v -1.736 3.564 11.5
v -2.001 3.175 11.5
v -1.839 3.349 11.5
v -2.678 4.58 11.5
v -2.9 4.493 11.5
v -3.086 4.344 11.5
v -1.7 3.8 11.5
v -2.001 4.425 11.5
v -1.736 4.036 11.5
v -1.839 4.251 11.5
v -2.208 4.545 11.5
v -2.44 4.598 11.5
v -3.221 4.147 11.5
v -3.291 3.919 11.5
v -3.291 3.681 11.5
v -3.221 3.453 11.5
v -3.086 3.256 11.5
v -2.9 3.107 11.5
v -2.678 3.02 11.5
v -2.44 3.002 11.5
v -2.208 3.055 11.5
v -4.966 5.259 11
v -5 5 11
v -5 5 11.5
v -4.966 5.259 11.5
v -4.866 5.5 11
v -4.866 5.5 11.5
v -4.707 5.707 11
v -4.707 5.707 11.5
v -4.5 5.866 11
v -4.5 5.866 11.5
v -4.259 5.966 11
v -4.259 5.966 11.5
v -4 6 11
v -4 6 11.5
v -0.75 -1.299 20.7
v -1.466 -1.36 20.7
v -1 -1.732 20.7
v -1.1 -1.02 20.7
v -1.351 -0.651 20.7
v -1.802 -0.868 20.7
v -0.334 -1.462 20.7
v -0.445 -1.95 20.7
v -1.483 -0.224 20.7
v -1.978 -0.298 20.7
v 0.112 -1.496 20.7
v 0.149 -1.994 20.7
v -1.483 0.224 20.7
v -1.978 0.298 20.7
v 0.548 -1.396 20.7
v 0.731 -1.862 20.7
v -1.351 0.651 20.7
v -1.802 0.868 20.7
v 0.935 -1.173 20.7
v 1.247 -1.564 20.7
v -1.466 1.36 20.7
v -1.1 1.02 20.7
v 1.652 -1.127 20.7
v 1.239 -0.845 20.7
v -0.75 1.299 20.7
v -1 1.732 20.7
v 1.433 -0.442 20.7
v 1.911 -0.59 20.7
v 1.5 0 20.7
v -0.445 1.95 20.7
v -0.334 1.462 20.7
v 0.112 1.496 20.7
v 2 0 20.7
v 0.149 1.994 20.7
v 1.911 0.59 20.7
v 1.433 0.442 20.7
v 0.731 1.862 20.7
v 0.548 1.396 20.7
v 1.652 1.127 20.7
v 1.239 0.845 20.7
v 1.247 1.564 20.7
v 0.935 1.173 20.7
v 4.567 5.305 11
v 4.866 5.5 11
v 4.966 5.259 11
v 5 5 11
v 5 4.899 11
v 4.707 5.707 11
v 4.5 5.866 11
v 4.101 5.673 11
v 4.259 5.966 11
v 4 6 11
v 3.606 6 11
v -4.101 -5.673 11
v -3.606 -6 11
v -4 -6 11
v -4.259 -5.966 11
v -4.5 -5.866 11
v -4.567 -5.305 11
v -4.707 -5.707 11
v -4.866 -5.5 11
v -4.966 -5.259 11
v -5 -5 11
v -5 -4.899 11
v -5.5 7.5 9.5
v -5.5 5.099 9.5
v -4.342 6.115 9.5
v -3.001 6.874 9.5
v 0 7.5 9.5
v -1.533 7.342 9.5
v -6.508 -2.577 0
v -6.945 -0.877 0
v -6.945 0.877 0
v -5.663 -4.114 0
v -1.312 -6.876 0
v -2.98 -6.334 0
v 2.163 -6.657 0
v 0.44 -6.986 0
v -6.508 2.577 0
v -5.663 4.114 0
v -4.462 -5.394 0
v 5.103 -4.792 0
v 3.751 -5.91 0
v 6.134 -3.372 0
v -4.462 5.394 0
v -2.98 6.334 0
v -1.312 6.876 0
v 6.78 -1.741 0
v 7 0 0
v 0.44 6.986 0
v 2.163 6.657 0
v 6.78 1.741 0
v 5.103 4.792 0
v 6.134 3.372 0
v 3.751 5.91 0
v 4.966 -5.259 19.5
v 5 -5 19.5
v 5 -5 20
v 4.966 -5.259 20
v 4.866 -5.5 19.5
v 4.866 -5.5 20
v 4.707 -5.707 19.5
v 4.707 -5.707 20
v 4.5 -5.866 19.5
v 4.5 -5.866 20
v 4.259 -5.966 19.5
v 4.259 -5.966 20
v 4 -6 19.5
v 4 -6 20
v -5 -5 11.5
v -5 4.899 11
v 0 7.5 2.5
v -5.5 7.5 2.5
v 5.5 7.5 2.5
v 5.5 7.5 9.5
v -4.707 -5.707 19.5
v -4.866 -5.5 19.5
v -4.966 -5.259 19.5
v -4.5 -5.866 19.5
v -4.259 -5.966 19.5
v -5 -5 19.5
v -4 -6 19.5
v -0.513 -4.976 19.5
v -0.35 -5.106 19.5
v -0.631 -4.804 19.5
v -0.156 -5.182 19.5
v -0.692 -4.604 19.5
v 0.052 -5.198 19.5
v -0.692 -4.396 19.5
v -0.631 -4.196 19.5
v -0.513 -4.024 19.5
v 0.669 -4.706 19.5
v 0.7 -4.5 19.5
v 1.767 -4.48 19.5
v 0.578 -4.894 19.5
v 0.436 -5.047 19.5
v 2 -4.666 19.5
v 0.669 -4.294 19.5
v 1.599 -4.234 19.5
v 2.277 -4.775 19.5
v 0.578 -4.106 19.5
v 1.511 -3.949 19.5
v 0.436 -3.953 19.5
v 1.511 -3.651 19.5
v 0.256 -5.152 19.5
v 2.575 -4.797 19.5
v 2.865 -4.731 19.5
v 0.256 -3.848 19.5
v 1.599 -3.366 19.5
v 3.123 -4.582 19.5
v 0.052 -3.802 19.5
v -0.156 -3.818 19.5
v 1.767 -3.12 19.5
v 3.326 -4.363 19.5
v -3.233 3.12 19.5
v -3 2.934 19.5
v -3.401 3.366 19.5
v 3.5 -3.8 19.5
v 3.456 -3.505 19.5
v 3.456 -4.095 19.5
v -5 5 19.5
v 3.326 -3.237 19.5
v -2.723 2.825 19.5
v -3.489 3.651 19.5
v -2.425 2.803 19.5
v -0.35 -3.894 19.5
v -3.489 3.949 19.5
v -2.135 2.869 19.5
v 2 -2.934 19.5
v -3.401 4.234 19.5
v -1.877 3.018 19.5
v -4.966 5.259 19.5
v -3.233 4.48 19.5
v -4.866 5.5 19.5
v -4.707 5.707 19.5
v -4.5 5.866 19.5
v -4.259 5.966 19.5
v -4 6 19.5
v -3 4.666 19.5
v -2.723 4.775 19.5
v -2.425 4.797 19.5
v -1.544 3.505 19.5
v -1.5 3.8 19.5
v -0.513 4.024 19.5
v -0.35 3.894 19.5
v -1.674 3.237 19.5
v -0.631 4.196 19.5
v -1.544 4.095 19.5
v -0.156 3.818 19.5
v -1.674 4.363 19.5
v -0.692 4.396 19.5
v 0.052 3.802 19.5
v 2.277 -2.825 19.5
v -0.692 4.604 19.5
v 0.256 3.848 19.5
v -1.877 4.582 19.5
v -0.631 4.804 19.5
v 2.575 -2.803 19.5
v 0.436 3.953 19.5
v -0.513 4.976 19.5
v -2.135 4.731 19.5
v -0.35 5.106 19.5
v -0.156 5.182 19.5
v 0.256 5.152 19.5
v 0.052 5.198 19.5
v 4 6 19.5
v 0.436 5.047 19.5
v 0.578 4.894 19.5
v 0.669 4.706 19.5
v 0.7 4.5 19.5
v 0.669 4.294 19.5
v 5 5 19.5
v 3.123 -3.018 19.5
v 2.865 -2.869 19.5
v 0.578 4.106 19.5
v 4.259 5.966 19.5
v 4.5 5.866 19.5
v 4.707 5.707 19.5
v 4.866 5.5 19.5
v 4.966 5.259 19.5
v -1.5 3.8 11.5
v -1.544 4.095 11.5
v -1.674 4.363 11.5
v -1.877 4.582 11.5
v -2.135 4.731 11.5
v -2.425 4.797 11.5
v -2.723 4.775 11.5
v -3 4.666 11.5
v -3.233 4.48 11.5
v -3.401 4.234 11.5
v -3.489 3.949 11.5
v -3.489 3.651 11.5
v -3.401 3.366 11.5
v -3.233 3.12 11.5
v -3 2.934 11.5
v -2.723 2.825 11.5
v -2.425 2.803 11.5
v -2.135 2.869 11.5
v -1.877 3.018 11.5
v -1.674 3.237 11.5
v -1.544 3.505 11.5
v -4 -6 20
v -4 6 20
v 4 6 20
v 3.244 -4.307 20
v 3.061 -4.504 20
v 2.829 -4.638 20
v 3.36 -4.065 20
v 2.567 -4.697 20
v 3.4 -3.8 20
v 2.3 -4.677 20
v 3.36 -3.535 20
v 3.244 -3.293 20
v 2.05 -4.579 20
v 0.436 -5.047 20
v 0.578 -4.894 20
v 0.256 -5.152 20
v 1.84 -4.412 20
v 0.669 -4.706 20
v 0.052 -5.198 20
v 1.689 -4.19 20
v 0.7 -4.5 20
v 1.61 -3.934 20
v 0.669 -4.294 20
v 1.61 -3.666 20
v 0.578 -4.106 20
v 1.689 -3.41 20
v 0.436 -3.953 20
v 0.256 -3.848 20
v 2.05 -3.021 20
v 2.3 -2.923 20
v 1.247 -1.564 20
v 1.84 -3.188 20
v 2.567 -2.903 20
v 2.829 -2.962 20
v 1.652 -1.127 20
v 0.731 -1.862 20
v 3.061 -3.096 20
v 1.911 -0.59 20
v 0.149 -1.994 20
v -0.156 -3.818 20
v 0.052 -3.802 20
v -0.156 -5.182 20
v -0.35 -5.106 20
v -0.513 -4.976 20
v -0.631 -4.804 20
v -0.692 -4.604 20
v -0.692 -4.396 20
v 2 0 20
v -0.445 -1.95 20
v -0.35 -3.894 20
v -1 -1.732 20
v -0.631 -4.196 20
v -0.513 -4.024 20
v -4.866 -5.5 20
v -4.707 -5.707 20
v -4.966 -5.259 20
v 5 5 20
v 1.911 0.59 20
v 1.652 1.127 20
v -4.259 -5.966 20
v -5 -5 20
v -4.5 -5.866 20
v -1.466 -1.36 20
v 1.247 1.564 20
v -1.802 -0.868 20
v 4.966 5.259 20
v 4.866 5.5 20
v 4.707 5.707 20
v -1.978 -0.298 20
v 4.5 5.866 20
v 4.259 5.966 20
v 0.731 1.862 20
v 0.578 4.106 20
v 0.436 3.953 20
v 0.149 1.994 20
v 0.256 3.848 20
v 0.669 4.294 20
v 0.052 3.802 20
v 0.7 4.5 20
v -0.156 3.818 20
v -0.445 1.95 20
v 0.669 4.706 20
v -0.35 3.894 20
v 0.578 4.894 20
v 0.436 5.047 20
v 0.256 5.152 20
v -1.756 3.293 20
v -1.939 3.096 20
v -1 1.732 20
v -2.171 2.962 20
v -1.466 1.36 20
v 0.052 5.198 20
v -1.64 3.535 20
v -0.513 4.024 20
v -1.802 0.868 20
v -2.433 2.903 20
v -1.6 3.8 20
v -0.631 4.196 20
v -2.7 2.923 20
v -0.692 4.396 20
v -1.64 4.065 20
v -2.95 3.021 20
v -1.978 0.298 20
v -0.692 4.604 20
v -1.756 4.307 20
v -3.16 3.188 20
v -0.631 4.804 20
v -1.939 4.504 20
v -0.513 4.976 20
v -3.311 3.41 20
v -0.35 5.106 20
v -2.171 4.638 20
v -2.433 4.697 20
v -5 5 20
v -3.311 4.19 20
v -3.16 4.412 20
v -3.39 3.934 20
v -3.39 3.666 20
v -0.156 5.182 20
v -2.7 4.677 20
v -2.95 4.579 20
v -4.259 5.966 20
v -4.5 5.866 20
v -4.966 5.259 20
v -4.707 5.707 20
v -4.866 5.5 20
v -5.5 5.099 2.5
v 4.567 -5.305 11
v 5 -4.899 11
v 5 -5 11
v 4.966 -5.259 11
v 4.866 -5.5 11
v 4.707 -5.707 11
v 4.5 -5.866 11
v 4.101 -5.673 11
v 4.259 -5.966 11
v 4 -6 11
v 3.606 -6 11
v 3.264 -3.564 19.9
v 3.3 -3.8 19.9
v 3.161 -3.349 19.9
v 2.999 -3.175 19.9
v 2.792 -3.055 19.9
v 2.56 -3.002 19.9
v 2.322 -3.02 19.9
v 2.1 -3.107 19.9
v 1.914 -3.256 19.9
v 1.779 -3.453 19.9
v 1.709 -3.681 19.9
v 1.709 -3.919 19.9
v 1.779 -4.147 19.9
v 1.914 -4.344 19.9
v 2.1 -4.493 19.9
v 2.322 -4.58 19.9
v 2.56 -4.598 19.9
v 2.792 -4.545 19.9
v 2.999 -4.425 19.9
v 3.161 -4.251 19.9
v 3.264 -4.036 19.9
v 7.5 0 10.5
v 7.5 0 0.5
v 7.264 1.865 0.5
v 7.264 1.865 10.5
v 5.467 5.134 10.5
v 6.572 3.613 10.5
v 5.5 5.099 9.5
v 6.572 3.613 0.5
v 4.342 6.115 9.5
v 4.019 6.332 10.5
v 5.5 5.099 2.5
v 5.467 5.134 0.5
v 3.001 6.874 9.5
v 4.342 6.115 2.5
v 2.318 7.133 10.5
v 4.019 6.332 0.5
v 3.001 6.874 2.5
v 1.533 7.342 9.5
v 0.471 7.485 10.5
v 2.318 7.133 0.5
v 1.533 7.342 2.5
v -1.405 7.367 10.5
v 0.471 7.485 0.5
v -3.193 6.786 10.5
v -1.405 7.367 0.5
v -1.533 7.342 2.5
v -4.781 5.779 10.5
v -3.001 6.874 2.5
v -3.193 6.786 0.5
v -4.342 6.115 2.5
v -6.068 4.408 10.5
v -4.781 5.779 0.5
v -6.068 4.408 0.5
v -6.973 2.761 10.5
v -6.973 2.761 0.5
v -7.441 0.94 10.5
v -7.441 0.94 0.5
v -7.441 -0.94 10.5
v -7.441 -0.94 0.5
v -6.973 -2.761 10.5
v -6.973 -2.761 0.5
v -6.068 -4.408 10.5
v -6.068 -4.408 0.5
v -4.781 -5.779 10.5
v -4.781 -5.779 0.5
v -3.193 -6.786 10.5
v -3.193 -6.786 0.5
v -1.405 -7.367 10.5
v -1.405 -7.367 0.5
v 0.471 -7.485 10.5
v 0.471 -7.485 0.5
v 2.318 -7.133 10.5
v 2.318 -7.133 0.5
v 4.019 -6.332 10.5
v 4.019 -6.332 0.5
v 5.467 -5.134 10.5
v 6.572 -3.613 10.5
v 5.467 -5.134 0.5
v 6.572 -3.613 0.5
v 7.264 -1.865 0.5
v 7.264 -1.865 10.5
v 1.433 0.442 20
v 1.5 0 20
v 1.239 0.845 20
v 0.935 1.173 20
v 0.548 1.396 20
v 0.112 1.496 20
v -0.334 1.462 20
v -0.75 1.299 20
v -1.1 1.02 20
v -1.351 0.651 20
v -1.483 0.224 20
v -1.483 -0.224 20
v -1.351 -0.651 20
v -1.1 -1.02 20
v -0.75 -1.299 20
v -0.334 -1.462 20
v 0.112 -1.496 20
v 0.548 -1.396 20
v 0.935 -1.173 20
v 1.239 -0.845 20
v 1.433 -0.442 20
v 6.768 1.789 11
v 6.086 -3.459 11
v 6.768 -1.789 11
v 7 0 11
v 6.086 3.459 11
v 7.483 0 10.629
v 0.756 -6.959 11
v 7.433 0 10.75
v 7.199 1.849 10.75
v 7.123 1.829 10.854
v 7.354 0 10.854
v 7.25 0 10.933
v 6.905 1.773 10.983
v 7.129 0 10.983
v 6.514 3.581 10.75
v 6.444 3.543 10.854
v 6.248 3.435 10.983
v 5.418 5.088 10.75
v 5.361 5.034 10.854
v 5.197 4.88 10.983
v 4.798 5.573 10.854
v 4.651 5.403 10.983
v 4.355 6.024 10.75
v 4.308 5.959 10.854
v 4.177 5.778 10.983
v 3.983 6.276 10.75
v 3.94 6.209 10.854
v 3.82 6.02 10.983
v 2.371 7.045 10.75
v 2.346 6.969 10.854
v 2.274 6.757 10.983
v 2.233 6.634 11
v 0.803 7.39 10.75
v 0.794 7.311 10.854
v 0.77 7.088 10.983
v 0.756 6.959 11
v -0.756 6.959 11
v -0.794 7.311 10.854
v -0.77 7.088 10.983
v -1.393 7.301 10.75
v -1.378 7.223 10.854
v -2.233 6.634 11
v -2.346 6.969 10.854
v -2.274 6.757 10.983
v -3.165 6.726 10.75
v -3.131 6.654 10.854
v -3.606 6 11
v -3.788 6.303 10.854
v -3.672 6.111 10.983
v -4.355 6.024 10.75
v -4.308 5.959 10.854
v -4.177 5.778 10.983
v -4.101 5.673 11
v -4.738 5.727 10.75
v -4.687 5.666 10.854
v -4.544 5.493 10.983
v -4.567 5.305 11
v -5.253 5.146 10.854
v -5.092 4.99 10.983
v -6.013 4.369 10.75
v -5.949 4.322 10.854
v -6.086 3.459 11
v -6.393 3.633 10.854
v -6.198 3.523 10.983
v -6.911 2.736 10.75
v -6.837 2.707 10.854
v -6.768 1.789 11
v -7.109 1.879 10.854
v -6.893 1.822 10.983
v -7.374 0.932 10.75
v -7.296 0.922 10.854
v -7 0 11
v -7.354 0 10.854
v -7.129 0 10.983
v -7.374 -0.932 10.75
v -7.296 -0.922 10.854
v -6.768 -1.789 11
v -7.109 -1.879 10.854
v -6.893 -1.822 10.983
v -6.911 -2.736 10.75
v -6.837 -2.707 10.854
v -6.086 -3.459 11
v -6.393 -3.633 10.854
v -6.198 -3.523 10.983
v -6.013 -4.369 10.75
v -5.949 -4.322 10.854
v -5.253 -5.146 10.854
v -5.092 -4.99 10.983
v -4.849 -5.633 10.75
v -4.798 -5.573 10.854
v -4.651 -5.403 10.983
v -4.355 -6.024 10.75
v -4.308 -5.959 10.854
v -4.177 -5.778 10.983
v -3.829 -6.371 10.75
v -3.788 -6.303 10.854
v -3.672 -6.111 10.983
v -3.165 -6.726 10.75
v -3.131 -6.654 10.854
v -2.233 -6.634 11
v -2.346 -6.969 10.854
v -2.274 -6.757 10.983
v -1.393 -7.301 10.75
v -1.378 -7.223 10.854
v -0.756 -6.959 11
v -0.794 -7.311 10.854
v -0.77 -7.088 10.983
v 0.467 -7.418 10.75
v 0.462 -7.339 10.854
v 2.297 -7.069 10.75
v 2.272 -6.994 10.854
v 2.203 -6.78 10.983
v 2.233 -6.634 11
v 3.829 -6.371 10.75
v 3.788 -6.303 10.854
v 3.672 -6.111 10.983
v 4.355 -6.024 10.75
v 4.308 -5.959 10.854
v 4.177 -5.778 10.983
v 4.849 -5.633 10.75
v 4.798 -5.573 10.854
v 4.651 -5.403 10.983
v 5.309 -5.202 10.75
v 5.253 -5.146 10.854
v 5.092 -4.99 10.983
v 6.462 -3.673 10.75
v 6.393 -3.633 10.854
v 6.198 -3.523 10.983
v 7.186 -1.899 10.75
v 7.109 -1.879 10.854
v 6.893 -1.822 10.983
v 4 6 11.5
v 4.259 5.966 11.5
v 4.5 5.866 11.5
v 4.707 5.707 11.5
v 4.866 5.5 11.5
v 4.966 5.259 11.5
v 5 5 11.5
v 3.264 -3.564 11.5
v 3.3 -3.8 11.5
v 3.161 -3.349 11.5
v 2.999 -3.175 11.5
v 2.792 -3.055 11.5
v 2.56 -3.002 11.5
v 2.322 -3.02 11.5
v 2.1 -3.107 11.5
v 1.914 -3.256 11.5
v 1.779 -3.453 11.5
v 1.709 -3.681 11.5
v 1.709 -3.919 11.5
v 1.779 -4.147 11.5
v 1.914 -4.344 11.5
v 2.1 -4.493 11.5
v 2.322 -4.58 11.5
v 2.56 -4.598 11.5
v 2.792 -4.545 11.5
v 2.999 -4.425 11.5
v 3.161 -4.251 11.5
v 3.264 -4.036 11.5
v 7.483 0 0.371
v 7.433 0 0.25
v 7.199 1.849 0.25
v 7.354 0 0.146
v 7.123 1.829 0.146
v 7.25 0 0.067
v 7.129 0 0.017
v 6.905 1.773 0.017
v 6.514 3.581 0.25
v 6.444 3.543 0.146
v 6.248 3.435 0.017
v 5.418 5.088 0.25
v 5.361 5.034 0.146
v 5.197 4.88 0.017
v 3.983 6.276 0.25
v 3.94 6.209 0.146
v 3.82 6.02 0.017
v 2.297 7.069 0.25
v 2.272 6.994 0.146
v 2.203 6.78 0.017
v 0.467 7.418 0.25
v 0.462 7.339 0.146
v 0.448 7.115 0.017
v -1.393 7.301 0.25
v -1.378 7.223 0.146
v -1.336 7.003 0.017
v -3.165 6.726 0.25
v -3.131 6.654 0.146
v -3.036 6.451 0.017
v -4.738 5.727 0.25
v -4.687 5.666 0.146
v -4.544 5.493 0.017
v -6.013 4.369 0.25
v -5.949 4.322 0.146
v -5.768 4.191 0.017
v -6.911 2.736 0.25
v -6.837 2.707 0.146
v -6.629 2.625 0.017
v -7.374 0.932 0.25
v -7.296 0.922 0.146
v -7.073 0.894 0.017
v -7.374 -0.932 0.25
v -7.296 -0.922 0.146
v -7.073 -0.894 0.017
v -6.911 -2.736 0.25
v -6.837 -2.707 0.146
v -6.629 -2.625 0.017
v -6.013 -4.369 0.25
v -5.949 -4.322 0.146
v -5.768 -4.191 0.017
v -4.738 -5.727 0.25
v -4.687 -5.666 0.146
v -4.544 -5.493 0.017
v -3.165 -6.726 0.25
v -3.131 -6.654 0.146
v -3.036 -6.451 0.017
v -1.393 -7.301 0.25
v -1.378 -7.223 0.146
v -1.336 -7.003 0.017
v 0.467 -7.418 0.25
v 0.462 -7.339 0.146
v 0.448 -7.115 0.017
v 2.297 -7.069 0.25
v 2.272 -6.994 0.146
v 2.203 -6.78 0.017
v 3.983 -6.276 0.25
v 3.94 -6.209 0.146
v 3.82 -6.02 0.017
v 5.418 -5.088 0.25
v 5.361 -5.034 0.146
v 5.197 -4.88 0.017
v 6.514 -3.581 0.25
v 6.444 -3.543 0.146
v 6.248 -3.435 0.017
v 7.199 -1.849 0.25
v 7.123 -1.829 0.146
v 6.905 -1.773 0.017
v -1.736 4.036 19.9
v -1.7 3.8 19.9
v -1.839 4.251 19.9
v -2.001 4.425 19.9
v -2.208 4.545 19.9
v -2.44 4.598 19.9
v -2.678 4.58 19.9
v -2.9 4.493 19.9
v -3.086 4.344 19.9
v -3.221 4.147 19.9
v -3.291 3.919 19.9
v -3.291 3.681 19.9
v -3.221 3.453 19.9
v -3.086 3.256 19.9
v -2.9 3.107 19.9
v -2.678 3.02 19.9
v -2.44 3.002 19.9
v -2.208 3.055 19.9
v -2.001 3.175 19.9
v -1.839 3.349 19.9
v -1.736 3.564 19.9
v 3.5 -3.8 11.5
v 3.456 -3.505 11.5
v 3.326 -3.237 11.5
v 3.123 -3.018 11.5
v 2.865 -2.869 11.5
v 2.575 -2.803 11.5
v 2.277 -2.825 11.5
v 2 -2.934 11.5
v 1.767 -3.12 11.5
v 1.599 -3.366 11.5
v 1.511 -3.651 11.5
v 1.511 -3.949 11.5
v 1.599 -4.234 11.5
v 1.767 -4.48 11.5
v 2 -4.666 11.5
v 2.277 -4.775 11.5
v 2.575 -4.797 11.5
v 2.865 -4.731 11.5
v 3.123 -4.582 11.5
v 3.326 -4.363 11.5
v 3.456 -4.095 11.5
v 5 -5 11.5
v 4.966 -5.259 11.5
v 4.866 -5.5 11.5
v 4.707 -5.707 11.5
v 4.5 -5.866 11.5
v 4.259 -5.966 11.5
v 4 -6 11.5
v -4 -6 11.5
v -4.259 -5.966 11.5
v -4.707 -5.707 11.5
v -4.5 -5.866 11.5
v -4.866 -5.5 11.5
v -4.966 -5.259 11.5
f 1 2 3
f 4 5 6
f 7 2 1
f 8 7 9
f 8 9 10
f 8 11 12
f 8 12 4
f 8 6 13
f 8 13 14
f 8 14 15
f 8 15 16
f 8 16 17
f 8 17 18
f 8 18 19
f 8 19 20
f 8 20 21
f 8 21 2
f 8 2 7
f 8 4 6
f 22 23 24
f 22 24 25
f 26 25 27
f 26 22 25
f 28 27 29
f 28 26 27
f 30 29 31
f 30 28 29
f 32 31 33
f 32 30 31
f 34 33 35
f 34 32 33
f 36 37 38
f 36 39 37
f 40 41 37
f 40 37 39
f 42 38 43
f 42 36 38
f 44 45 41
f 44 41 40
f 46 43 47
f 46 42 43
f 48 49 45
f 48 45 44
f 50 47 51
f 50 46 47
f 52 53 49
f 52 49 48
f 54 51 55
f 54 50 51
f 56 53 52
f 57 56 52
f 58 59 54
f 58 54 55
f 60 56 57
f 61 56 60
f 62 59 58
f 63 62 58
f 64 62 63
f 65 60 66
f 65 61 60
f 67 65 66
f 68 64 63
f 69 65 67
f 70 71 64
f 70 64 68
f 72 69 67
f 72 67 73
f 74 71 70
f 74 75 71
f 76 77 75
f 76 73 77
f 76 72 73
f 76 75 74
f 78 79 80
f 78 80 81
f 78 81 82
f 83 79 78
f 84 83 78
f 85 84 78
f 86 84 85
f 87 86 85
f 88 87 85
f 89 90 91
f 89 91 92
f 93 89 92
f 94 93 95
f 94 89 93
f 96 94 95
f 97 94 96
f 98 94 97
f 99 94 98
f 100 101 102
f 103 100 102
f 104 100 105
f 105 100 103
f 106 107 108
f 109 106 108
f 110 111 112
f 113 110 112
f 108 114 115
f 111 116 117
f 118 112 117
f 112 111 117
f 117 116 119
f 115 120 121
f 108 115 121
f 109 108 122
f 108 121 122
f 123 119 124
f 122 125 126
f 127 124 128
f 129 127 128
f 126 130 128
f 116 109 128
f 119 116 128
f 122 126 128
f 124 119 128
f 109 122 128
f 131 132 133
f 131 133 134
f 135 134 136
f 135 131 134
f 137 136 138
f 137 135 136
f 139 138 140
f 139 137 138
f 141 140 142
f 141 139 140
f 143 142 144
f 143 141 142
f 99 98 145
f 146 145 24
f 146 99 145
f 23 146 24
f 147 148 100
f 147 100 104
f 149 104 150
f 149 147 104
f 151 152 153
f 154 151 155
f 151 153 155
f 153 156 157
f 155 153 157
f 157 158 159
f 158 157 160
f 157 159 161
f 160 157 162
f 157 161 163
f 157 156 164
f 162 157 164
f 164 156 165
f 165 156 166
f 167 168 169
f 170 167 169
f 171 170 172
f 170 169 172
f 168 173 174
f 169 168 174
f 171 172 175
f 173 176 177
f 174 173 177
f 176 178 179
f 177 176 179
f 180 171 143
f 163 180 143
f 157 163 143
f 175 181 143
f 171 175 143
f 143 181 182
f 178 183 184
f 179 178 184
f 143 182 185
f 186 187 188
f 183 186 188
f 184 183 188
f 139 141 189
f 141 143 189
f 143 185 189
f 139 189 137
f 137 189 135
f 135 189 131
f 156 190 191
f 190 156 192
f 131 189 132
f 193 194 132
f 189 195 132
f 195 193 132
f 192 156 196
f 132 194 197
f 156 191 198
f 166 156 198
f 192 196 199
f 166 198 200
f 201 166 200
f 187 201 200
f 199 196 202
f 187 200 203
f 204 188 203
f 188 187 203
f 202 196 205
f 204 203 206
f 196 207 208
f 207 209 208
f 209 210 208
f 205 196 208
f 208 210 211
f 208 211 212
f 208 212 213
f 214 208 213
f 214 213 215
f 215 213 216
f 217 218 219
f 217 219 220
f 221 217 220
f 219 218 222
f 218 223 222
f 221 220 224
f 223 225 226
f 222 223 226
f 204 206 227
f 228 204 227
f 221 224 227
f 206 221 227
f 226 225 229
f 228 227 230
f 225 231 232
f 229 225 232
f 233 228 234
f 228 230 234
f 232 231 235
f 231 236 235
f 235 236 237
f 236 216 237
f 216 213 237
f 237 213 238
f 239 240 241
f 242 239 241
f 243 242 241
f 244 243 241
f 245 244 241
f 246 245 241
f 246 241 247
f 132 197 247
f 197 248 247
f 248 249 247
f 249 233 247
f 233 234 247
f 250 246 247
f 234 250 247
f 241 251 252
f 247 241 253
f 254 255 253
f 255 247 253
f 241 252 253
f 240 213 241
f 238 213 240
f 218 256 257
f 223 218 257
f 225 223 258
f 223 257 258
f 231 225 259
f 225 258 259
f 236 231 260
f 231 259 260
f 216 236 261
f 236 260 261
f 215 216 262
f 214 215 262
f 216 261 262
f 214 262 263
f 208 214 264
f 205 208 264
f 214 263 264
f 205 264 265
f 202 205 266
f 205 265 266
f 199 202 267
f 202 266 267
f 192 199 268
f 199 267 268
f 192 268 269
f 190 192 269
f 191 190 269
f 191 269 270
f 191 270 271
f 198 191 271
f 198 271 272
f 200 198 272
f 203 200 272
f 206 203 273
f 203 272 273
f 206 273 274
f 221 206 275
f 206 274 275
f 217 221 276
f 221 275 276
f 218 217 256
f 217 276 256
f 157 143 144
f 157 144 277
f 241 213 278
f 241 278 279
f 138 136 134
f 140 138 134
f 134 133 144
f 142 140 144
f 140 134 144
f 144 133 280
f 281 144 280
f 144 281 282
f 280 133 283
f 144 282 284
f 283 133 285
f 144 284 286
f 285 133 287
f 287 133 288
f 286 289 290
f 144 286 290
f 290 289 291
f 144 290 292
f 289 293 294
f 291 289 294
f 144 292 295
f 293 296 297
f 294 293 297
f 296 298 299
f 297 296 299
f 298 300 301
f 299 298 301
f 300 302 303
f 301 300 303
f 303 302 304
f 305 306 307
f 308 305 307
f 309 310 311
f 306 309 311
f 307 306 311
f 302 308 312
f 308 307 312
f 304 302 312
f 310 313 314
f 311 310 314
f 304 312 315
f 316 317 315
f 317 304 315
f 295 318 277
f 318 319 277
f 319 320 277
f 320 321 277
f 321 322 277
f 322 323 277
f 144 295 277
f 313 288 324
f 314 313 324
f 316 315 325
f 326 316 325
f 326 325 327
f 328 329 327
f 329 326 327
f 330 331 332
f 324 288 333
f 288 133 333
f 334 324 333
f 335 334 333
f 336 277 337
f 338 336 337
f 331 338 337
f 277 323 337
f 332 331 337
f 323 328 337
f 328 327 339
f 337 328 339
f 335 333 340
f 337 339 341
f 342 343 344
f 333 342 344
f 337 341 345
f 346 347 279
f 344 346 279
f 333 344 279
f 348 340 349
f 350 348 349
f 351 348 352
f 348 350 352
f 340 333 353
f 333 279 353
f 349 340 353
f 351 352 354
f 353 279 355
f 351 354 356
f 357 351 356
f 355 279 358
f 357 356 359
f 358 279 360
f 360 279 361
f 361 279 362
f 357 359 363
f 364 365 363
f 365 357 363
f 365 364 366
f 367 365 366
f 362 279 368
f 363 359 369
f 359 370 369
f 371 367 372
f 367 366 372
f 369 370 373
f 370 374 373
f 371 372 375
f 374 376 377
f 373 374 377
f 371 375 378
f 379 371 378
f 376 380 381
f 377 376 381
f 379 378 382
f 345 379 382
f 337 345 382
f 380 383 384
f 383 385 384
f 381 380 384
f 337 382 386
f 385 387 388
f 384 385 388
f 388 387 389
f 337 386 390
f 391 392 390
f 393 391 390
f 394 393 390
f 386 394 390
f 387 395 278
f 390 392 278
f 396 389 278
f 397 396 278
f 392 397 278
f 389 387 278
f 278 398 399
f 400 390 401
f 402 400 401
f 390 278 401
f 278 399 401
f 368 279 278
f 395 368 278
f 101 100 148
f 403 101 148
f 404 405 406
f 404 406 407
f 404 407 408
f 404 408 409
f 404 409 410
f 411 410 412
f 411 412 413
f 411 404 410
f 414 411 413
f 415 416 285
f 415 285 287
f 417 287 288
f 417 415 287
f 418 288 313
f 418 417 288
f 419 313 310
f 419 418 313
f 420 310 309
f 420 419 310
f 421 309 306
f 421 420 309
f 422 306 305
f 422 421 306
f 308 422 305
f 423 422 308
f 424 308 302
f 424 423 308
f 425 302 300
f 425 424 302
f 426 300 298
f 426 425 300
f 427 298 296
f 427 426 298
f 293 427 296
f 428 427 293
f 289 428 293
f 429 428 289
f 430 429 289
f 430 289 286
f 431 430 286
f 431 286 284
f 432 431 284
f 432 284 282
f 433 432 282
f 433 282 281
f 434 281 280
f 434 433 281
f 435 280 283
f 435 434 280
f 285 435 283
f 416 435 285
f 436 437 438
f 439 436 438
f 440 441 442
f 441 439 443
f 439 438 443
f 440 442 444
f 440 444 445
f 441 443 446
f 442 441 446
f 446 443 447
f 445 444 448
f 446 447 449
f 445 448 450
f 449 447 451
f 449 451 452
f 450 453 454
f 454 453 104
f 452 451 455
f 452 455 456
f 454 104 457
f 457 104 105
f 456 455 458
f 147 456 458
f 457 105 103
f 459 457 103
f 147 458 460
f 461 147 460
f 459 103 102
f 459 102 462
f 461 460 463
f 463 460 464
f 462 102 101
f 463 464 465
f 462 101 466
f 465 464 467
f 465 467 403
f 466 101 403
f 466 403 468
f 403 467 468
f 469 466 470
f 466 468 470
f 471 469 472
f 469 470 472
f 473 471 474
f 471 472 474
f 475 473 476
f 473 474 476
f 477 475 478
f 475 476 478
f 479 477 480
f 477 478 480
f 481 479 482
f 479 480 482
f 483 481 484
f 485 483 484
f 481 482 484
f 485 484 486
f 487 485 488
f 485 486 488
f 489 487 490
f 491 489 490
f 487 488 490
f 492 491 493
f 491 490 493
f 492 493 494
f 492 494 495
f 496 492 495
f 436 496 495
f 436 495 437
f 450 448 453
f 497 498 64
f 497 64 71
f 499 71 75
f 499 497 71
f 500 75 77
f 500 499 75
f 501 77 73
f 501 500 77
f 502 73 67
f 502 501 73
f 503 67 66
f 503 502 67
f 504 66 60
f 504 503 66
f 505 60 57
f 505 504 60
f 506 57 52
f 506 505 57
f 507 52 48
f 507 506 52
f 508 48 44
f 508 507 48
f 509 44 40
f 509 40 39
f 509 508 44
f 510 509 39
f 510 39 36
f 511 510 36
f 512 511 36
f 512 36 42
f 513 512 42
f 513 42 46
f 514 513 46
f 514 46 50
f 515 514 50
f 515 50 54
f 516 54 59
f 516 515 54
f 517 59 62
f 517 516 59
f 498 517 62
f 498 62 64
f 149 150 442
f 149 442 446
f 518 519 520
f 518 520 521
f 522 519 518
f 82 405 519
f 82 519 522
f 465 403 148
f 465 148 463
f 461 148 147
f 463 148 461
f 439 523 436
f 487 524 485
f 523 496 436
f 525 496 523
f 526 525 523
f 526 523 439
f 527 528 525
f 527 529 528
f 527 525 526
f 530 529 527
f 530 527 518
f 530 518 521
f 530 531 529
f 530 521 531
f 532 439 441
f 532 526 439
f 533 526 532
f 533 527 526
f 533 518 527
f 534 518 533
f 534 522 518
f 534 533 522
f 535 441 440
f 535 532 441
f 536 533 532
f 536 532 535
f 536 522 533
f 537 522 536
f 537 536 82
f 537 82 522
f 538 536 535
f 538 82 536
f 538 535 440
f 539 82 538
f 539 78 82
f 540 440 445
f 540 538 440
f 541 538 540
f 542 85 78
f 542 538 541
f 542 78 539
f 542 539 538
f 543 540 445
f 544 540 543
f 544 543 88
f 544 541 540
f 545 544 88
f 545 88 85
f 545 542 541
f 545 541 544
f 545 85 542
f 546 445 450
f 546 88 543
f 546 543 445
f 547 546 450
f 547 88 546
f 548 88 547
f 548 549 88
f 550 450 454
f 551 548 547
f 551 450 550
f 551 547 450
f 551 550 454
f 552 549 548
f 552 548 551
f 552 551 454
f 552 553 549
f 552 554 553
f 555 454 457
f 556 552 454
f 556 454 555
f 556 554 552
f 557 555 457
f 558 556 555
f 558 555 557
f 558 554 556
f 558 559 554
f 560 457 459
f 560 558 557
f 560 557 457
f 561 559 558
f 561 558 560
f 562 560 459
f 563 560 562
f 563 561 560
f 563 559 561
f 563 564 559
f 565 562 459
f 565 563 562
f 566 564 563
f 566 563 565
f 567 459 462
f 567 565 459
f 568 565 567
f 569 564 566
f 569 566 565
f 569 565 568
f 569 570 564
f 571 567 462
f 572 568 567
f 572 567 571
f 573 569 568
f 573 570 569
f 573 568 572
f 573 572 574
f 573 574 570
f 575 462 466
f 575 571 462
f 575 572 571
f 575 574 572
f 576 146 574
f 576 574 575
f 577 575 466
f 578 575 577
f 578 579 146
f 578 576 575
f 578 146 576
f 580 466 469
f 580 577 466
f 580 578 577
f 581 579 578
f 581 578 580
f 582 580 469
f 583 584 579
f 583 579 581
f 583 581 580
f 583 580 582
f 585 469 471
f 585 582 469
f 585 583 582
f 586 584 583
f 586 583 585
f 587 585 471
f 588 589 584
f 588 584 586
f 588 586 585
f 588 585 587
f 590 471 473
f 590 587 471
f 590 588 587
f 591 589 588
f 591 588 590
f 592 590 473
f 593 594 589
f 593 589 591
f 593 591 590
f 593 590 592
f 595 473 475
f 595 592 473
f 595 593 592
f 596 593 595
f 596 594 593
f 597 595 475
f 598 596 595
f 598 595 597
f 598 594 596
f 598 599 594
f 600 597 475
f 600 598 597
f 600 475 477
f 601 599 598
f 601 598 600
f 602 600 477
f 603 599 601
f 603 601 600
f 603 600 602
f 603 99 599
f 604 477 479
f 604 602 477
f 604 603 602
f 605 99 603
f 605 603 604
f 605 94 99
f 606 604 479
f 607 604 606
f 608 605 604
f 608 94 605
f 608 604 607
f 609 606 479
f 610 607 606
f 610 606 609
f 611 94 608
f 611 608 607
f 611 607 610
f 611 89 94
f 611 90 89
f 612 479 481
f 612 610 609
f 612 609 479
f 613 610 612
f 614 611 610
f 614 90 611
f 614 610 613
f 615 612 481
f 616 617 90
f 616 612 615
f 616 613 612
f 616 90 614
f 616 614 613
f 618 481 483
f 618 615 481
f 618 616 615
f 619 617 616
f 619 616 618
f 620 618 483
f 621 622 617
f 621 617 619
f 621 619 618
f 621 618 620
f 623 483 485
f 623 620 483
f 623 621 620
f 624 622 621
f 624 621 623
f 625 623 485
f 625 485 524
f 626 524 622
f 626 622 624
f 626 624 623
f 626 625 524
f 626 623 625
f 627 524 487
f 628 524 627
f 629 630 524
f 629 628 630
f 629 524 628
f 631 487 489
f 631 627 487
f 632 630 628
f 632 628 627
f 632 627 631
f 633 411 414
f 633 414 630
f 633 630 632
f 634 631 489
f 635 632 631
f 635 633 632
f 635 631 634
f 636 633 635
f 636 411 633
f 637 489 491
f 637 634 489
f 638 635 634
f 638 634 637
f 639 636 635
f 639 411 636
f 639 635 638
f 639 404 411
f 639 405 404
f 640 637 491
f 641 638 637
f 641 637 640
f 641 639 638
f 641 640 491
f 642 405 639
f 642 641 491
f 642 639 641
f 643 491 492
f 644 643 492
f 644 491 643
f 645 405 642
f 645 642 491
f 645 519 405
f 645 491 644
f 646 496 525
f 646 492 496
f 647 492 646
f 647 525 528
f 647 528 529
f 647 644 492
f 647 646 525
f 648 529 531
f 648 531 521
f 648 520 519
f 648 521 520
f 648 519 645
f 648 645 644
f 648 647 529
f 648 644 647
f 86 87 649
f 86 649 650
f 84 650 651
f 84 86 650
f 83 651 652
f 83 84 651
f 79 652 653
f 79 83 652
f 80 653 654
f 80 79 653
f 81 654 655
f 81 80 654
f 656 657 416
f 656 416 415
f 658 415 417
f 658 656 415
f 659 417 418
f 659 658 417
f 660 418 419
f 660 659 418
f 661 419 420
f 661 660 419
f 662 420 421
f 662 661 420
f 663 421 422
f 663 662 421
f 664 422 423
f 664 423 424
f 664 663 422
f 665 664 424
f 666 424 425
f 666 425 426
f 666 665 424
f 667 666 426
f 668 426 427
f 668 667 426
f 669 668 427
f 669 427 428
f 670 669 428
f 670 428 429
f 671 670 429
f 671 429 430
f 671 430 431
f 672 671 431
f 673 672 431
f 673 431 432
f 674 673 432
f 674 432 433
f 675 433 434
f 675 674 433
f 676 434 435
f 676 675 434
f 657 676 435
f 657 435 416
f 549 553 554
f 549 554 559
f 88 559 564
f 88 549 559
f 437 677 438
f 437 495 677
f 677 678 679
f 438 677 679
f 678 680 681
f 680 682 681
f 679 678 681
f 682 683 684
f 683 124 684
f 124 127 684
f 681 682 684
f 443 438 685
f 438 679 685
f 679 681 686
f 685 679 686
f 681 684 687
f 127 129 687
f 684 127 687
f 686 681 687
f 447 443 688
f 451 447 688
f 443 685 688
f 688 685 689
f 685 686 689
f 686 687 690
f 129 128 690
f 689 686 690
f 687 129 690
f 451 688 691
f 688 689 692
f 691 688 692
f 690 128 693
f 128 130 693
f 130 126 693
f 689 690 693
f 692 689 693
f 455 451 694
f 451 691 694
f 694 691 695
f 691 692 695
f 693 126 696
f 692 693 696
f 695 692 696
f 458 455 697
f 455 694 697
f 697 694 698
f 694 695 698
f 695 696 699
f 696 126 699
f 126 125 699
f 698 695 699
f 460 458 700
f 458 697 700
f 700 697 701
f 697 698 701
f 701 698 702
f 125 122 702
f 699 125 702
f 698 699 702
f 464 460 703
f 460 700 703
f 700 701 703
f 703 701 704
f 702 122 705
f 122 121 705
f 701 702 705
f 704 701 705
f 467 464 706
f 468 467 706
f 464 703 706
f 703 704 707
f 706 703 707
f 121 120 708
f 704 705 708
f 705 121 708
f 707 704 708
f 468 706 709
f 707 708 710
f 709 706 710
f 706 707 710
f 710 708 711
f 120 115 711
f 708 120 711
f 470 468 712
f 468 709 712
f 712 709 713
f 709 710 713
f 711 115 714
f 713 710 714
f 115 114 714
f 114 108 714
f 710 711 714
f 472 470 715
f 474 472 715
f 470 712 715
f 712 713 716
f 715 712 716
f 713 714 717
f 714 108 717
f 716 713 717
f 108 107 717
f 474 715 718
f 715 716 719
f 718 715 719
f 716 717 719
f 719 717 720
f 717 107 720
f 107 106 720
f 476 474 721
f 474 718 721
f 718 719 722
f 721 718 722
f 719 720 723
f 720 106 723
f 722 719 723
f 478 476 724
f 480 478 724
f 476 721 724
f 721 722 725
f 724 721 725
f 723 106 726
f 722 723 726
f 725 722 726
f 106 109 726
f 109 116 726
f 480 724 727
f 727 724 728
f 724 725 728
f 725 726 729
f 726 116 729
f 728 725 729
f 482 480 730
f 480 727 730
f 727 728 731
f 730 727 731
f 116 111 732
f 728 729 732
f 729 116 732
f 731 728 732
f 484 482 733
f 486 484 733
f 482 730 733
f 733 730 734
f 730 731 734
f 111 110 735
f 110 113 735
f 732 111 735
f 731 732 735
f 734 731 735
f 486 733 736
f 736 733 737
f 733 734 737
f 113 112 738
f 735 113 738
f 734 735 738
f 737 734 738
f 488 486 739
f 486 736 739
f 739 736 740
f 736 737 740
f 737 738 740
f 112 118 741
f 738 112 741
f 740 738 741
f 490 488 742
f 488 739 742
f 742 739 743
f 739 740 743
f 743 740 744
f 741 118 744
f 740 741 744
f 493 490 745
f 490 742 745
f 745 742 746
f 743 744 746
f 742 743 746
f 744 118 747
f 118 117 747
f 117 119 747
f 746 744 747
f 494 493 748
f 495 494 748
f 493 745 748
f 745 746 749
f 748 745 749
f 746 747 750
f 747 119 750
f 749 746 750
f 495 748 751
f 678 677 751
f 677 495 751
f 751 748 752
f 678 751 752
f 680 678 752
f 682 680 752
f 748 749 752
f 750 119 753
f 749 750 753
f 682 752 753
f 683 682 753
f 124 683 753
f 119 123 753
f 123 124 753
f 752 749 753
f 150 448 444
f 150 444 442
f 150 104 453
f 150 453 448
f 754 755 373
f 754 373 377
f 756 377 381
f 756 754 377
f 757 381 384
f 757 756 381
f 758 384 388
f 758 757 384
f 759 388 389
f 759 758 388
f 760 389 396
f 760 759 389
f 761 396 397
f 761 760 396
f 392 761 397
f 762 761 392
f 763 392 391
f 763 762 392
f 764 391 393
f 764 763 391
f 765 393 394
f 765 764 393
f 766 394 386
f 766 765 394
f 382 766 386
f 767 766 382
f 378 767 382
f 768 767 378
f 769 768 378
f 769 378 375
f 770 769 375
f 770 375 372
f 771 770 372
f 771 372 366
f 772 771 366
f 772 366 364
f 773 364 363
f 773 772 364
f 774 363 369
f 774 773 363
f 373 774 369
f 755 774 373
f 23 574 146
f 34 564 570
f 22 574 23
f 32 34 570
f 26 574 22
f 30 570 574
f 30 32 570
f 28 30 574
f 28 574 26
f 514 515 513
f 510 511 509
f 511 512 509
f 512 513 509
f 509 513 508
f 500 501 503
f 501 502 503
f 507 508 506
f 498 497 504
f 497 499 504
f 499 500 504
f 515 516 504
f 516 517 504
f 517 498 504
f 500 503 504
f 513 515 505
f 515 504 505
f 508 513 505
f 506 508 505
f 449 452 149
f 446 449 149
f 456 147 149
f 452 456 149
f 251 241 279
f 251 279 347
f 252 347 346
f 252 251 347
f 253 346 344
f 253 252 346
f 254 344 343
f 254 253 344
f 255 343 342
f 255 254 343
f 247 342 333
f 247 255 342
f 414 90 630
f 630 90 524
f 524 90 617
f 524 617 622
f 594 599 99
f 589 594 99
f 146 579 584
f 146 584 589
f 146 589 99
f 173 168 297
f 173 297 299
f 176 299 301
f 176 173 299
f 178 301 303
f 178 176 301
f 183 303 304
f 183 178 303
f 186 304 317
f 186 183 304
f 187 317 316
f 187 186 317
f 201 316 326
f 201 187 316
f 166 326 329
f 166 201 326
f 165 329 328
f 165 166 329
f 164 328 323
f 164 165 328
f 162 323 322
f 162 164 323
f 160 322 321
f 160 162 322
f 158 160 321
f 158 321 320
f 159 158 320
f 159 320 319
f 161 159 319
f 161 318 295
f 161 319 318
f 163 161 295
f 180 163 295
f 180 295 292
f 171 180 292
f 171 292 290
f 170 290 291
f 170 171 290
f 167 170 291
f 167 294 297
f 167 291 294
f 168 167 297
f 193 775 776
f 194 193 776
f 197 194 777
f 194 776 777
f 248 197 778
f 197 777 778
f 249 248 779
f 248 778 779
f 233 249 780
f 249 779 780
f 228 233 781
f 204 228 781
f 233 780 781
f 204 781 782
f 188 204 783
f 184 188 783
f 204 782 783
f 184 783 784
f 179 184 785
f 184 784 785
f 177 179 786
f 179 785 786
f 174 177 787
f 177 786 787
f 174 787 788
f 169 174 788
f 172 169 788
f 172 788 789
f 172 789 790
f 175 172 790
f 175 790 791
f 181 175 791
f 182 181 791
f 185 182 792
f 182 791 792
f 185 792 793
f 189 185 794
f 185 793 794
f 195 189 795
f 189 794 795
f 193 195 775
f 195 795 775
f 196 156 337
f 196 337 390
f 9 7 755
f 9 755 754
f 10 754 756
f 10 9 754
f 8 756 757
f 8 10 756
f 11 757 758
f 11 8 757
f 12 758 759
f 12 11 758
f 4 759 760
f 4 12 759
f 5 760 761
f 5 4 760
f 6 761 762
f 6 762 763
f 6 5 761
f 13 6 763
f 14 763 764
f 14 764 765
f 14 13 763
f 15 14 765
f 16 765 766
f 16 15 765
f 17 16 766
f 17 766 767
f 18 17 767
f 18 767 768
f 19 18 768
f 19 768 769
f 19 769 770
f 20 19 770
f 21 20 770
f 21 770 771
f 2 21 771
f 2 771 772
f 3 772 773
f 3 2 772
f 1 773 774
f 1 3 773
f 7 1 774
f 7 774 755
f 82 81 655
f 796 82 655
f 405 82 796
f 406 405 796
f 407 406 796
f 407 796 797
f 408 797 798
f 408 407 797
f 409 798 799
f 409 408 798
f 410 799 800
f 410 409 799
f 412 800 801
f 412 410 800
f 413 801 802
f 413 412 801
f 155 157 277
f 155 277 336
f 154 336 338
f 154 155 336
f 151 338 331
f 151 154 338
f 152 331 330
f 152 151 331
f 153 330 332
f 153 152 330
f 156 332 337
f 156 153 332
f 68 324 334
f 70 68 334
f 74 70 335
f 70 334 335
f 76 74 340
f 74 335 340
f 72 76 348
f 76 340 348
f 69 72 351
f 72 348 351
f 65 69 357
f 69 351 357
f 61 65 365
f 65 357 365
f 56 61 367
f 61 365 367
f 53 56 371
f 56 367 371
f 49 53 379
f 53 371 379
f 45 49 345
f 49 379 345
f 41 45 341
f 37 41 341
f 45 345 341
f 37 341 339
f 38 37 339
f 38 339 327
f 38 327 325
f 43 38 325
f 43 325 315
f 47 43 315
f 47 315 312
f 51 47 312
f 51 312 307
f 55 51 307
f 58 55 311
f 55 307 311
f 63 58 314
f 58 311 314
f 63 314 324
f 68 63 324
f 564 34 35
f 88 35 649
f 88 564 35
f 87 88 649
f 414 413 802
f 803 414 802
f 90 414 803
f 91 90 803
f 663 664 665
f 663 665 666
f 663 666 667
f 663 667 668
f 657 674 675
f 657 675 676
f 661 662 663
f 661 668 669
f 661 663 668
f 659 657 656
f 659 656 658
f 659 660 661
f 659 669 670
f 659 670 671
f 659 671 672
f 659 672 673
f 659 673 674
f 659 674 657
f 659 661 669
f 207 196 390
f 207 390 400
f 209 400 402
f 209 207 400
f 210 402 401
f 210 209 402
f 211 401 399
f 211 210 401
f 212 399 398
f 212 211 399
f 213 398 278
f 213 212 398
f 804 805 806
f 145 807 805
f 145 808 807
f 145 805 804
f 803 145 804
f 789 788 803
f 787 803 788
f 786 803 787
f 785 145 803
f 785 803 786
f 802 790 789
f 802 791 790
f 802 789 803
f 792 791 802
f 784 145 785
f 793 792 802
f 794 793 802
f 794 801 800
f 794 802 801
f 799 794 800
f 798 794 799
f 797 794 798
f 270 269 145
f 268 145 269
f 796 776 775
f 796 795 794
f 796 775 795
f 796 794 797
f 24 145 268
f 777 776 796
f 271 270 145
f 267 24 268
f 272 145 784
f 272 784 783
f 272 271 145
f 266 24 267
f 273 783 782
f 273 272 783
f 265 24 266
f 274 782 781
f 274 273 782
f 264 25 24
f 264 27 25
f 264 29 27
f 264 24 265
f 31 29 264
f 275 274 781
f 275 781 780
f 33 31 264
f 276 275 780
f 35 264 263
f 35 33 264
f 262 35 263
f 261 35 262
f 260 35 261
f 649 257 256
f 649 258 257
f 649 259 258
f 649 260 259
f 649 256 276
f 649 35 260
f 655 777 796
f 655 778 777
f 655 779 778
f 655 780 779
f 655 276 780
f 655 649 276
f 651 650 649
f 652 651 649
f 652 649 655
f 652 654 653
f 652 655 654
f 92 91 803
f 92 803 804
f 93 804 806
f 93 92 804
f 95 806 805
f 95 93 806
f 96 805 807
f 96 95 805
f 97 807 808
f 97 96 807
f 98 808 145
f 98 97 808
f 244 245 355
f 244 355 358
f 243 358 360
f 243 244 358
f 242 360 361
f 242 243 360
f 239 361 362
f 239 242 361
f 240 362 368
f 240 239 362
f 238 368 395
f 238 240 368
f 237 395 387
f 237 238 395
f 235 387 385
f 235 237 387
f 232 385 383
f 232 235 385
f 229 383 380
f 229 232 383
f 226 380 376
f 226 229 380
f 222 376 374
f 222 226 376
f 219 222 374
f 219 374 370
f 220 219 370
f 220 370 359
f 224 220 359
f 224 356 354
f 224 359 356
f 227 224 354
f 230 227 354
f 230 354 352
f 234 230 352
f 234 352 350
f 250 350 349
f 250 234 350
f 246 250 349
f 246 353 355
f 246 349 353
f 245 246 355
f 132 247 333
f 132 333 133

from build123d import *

# Parameters (mm, degrees)
SKETCH1_R           = 7.5
BOSS_EXTRUDE1_DEPTH = 11
FILLET1_R           = 0.5
BOSS_EXTRUDE2_DEPTH = 9
SKETCH3_W           = 20
SKETCH3_H           = 20
CUT_EXTRUDE4_DEPTH  = 4
SKETCH5_R           = 1
BOSS_EXTRUDE3_DEPTH = 8
SKETCH5_3_R         = 0.7
CUT_EXTRUDE5_DEPTH  = 10
SKETCH5_4_R         = 0.8
CUT_EXTRUDE6_DEPTH  = 8.5
SKETCH6_R           = 2
SKETCH6_R_2         = 1.5
BOSS_EXTRUDE4_DEPTH = 0.7
CHAMFER1_SIZE       = 0.1
SKETCH9_W           = 11
SKETCH9_H           = 7
BOSS_EXTRUDE6_DEPTH = 3


with BuildPart() as part:
    # Sketch1 → Boss-Extrude1 (new body)
    with BuildSketch(Plane.XY):
        Circle(SKETCH1_R)
    extrude(amount=BOSS_EXTRUDE1_DEPTH)

    # Fillet1
    fillet1_edges = [part.edges().sort_by_distance(p)[0] for p in [
        (-7.5, 0, 0),
        (-7.5, 0, 11),
    ]]
    fillet(fillet1_edges, radius=FILLET1_R)

    # Sketch2 → Boss-Extrude2 (add)
    with BuildSketch(Plane.XY.offset(11)):
        with BuildLine():
            Line((-4, 6), (4, 6))
            ThreePointArc((4, 6), (4.707106781, 5.707106781), (5, 5))
            Line((5, 5), (5, -5))
            ThreePointArc((5, -5), (4.707106781, -5.707106781), (4, -6))
            Line((4, -6), (-4, -6))
            ThreePointArc((-4, -6), (-4.707106781, -5.707106781), (-5, -5))
            Line((-5, -5), (-5, 5))
            ThreePointArc((-5, 5), (-4.707106781, 5.707106781), (-4, 6))
        make_face()
    extrude(amount=BOSS_EXTRUDE2_DEPTH)

    # Sketch3 → Cut-Extrude4 (cut, symmetric)
    with BuildSketch(Plane.XY.offset(15.5)):
        Rectangle(SKETCH3_W, SKETCH3_H)
    extrude(amount=CUT_EXTRUDE4_DEPTH, both=True, mode=Mode.SUBTRACT)


with BuildPart() as cut_extrude4_piece_1:
    # of the separate pieces the step leaves, piece 1, a body of its own (cut_extrude4_pieces)
    add(part.part.solids().sort_by_distance((7.5, 0, 0.5))[0])



with BuildPart() as cut_extrude4_piece_2:
    # of the separate pieces the step leaves, piece 2, a body of its own (cut_extrude4_pieces)
    add(part.part.solids().sort_by_distance((5, -5, 19.5))[0])


with BuildPart() as cut_extrude4_piece_1_1:
    add(cut_extrude4_piece_1.part)

    add(cut_extrude4_piece_2.part)  # Boss-Extrude3 merges Cut-Extrude4 piece 2
    # Sketch5 → Boss-Extrude3 (add)
    with BuildSketch(Plane.XY.offset(11.5)):
        with Locations((-2.5, 3.8)):
            Circle(SKETCH5_R)
        with Locations((2.5, -3.8)):
            Circle(SKETCH5_R)
    extrude(amount=BOSS_EXTRUDE3_DEPTH)

    # Sketch5<3> → Cut-Extrude5 (cut)
    with BuildSketch(Plane.XY.offset(11.5)):
        with Locations((0, 4.5)):
            Circle(SKETCH5_3_R)
        with Locations((0, -4.5)):
            Circle(SKETCH5_3_R)
    extrude(amount=CUT_EXTRUDE5_DEPTH, mode=Mode.SUBTRACT)

    # Sketch5<4> → Cut-Extrude6 (cut)
    with BuildSketch(Plane.XY.offset(11.5)):
        with Locations((-2.5, 3.8)):
            Circle(SKETCH5_4_R)
        with Locations((2.5, -3.8)):
            Circle(SKETCH5_4_R)
    extrude(amount=CUT_EXTRUDE6_DEPTH, mode=Mode.SUBTRACT)

    # Sketch6 → Boss-Extrude4 (add)
    with BuildSketch(Plane.XY.offset(20)):
        Circle(SKETCH6_R)
        Circle(SKETCH6_R_2, mode=Mode.SUBTRACT)
    extrude(amount=BOSS_EXTRUDE4_DEPTH)

    # Chamfer1
    chamfer1_edges = [cut_extrude4_piece_1_1.edges().sort_by_distance(p)[0] for p in [
        (-3.3, 3.8, 20),
        (1.7, -3.8, 20),
    ]]
    chamfer(chamfer1_edges, length=CHAMFER1_SIZE)

    # Sketch9 → Boss-Extrude6 (add)
    with BuildSketch(Plane(origin=(0, 7.5, 0), x_dir=(1, 0, 0), z_dir=(0, 1, 0))):
        with Locations((0, -6)):
            Rectangle(SKETCH9_W, SKETCH9_H)
    extrude(amount=-BOSS_EXTRUDE6_DEPTH)


solid = cut_extrude4_piece_1_1.part
